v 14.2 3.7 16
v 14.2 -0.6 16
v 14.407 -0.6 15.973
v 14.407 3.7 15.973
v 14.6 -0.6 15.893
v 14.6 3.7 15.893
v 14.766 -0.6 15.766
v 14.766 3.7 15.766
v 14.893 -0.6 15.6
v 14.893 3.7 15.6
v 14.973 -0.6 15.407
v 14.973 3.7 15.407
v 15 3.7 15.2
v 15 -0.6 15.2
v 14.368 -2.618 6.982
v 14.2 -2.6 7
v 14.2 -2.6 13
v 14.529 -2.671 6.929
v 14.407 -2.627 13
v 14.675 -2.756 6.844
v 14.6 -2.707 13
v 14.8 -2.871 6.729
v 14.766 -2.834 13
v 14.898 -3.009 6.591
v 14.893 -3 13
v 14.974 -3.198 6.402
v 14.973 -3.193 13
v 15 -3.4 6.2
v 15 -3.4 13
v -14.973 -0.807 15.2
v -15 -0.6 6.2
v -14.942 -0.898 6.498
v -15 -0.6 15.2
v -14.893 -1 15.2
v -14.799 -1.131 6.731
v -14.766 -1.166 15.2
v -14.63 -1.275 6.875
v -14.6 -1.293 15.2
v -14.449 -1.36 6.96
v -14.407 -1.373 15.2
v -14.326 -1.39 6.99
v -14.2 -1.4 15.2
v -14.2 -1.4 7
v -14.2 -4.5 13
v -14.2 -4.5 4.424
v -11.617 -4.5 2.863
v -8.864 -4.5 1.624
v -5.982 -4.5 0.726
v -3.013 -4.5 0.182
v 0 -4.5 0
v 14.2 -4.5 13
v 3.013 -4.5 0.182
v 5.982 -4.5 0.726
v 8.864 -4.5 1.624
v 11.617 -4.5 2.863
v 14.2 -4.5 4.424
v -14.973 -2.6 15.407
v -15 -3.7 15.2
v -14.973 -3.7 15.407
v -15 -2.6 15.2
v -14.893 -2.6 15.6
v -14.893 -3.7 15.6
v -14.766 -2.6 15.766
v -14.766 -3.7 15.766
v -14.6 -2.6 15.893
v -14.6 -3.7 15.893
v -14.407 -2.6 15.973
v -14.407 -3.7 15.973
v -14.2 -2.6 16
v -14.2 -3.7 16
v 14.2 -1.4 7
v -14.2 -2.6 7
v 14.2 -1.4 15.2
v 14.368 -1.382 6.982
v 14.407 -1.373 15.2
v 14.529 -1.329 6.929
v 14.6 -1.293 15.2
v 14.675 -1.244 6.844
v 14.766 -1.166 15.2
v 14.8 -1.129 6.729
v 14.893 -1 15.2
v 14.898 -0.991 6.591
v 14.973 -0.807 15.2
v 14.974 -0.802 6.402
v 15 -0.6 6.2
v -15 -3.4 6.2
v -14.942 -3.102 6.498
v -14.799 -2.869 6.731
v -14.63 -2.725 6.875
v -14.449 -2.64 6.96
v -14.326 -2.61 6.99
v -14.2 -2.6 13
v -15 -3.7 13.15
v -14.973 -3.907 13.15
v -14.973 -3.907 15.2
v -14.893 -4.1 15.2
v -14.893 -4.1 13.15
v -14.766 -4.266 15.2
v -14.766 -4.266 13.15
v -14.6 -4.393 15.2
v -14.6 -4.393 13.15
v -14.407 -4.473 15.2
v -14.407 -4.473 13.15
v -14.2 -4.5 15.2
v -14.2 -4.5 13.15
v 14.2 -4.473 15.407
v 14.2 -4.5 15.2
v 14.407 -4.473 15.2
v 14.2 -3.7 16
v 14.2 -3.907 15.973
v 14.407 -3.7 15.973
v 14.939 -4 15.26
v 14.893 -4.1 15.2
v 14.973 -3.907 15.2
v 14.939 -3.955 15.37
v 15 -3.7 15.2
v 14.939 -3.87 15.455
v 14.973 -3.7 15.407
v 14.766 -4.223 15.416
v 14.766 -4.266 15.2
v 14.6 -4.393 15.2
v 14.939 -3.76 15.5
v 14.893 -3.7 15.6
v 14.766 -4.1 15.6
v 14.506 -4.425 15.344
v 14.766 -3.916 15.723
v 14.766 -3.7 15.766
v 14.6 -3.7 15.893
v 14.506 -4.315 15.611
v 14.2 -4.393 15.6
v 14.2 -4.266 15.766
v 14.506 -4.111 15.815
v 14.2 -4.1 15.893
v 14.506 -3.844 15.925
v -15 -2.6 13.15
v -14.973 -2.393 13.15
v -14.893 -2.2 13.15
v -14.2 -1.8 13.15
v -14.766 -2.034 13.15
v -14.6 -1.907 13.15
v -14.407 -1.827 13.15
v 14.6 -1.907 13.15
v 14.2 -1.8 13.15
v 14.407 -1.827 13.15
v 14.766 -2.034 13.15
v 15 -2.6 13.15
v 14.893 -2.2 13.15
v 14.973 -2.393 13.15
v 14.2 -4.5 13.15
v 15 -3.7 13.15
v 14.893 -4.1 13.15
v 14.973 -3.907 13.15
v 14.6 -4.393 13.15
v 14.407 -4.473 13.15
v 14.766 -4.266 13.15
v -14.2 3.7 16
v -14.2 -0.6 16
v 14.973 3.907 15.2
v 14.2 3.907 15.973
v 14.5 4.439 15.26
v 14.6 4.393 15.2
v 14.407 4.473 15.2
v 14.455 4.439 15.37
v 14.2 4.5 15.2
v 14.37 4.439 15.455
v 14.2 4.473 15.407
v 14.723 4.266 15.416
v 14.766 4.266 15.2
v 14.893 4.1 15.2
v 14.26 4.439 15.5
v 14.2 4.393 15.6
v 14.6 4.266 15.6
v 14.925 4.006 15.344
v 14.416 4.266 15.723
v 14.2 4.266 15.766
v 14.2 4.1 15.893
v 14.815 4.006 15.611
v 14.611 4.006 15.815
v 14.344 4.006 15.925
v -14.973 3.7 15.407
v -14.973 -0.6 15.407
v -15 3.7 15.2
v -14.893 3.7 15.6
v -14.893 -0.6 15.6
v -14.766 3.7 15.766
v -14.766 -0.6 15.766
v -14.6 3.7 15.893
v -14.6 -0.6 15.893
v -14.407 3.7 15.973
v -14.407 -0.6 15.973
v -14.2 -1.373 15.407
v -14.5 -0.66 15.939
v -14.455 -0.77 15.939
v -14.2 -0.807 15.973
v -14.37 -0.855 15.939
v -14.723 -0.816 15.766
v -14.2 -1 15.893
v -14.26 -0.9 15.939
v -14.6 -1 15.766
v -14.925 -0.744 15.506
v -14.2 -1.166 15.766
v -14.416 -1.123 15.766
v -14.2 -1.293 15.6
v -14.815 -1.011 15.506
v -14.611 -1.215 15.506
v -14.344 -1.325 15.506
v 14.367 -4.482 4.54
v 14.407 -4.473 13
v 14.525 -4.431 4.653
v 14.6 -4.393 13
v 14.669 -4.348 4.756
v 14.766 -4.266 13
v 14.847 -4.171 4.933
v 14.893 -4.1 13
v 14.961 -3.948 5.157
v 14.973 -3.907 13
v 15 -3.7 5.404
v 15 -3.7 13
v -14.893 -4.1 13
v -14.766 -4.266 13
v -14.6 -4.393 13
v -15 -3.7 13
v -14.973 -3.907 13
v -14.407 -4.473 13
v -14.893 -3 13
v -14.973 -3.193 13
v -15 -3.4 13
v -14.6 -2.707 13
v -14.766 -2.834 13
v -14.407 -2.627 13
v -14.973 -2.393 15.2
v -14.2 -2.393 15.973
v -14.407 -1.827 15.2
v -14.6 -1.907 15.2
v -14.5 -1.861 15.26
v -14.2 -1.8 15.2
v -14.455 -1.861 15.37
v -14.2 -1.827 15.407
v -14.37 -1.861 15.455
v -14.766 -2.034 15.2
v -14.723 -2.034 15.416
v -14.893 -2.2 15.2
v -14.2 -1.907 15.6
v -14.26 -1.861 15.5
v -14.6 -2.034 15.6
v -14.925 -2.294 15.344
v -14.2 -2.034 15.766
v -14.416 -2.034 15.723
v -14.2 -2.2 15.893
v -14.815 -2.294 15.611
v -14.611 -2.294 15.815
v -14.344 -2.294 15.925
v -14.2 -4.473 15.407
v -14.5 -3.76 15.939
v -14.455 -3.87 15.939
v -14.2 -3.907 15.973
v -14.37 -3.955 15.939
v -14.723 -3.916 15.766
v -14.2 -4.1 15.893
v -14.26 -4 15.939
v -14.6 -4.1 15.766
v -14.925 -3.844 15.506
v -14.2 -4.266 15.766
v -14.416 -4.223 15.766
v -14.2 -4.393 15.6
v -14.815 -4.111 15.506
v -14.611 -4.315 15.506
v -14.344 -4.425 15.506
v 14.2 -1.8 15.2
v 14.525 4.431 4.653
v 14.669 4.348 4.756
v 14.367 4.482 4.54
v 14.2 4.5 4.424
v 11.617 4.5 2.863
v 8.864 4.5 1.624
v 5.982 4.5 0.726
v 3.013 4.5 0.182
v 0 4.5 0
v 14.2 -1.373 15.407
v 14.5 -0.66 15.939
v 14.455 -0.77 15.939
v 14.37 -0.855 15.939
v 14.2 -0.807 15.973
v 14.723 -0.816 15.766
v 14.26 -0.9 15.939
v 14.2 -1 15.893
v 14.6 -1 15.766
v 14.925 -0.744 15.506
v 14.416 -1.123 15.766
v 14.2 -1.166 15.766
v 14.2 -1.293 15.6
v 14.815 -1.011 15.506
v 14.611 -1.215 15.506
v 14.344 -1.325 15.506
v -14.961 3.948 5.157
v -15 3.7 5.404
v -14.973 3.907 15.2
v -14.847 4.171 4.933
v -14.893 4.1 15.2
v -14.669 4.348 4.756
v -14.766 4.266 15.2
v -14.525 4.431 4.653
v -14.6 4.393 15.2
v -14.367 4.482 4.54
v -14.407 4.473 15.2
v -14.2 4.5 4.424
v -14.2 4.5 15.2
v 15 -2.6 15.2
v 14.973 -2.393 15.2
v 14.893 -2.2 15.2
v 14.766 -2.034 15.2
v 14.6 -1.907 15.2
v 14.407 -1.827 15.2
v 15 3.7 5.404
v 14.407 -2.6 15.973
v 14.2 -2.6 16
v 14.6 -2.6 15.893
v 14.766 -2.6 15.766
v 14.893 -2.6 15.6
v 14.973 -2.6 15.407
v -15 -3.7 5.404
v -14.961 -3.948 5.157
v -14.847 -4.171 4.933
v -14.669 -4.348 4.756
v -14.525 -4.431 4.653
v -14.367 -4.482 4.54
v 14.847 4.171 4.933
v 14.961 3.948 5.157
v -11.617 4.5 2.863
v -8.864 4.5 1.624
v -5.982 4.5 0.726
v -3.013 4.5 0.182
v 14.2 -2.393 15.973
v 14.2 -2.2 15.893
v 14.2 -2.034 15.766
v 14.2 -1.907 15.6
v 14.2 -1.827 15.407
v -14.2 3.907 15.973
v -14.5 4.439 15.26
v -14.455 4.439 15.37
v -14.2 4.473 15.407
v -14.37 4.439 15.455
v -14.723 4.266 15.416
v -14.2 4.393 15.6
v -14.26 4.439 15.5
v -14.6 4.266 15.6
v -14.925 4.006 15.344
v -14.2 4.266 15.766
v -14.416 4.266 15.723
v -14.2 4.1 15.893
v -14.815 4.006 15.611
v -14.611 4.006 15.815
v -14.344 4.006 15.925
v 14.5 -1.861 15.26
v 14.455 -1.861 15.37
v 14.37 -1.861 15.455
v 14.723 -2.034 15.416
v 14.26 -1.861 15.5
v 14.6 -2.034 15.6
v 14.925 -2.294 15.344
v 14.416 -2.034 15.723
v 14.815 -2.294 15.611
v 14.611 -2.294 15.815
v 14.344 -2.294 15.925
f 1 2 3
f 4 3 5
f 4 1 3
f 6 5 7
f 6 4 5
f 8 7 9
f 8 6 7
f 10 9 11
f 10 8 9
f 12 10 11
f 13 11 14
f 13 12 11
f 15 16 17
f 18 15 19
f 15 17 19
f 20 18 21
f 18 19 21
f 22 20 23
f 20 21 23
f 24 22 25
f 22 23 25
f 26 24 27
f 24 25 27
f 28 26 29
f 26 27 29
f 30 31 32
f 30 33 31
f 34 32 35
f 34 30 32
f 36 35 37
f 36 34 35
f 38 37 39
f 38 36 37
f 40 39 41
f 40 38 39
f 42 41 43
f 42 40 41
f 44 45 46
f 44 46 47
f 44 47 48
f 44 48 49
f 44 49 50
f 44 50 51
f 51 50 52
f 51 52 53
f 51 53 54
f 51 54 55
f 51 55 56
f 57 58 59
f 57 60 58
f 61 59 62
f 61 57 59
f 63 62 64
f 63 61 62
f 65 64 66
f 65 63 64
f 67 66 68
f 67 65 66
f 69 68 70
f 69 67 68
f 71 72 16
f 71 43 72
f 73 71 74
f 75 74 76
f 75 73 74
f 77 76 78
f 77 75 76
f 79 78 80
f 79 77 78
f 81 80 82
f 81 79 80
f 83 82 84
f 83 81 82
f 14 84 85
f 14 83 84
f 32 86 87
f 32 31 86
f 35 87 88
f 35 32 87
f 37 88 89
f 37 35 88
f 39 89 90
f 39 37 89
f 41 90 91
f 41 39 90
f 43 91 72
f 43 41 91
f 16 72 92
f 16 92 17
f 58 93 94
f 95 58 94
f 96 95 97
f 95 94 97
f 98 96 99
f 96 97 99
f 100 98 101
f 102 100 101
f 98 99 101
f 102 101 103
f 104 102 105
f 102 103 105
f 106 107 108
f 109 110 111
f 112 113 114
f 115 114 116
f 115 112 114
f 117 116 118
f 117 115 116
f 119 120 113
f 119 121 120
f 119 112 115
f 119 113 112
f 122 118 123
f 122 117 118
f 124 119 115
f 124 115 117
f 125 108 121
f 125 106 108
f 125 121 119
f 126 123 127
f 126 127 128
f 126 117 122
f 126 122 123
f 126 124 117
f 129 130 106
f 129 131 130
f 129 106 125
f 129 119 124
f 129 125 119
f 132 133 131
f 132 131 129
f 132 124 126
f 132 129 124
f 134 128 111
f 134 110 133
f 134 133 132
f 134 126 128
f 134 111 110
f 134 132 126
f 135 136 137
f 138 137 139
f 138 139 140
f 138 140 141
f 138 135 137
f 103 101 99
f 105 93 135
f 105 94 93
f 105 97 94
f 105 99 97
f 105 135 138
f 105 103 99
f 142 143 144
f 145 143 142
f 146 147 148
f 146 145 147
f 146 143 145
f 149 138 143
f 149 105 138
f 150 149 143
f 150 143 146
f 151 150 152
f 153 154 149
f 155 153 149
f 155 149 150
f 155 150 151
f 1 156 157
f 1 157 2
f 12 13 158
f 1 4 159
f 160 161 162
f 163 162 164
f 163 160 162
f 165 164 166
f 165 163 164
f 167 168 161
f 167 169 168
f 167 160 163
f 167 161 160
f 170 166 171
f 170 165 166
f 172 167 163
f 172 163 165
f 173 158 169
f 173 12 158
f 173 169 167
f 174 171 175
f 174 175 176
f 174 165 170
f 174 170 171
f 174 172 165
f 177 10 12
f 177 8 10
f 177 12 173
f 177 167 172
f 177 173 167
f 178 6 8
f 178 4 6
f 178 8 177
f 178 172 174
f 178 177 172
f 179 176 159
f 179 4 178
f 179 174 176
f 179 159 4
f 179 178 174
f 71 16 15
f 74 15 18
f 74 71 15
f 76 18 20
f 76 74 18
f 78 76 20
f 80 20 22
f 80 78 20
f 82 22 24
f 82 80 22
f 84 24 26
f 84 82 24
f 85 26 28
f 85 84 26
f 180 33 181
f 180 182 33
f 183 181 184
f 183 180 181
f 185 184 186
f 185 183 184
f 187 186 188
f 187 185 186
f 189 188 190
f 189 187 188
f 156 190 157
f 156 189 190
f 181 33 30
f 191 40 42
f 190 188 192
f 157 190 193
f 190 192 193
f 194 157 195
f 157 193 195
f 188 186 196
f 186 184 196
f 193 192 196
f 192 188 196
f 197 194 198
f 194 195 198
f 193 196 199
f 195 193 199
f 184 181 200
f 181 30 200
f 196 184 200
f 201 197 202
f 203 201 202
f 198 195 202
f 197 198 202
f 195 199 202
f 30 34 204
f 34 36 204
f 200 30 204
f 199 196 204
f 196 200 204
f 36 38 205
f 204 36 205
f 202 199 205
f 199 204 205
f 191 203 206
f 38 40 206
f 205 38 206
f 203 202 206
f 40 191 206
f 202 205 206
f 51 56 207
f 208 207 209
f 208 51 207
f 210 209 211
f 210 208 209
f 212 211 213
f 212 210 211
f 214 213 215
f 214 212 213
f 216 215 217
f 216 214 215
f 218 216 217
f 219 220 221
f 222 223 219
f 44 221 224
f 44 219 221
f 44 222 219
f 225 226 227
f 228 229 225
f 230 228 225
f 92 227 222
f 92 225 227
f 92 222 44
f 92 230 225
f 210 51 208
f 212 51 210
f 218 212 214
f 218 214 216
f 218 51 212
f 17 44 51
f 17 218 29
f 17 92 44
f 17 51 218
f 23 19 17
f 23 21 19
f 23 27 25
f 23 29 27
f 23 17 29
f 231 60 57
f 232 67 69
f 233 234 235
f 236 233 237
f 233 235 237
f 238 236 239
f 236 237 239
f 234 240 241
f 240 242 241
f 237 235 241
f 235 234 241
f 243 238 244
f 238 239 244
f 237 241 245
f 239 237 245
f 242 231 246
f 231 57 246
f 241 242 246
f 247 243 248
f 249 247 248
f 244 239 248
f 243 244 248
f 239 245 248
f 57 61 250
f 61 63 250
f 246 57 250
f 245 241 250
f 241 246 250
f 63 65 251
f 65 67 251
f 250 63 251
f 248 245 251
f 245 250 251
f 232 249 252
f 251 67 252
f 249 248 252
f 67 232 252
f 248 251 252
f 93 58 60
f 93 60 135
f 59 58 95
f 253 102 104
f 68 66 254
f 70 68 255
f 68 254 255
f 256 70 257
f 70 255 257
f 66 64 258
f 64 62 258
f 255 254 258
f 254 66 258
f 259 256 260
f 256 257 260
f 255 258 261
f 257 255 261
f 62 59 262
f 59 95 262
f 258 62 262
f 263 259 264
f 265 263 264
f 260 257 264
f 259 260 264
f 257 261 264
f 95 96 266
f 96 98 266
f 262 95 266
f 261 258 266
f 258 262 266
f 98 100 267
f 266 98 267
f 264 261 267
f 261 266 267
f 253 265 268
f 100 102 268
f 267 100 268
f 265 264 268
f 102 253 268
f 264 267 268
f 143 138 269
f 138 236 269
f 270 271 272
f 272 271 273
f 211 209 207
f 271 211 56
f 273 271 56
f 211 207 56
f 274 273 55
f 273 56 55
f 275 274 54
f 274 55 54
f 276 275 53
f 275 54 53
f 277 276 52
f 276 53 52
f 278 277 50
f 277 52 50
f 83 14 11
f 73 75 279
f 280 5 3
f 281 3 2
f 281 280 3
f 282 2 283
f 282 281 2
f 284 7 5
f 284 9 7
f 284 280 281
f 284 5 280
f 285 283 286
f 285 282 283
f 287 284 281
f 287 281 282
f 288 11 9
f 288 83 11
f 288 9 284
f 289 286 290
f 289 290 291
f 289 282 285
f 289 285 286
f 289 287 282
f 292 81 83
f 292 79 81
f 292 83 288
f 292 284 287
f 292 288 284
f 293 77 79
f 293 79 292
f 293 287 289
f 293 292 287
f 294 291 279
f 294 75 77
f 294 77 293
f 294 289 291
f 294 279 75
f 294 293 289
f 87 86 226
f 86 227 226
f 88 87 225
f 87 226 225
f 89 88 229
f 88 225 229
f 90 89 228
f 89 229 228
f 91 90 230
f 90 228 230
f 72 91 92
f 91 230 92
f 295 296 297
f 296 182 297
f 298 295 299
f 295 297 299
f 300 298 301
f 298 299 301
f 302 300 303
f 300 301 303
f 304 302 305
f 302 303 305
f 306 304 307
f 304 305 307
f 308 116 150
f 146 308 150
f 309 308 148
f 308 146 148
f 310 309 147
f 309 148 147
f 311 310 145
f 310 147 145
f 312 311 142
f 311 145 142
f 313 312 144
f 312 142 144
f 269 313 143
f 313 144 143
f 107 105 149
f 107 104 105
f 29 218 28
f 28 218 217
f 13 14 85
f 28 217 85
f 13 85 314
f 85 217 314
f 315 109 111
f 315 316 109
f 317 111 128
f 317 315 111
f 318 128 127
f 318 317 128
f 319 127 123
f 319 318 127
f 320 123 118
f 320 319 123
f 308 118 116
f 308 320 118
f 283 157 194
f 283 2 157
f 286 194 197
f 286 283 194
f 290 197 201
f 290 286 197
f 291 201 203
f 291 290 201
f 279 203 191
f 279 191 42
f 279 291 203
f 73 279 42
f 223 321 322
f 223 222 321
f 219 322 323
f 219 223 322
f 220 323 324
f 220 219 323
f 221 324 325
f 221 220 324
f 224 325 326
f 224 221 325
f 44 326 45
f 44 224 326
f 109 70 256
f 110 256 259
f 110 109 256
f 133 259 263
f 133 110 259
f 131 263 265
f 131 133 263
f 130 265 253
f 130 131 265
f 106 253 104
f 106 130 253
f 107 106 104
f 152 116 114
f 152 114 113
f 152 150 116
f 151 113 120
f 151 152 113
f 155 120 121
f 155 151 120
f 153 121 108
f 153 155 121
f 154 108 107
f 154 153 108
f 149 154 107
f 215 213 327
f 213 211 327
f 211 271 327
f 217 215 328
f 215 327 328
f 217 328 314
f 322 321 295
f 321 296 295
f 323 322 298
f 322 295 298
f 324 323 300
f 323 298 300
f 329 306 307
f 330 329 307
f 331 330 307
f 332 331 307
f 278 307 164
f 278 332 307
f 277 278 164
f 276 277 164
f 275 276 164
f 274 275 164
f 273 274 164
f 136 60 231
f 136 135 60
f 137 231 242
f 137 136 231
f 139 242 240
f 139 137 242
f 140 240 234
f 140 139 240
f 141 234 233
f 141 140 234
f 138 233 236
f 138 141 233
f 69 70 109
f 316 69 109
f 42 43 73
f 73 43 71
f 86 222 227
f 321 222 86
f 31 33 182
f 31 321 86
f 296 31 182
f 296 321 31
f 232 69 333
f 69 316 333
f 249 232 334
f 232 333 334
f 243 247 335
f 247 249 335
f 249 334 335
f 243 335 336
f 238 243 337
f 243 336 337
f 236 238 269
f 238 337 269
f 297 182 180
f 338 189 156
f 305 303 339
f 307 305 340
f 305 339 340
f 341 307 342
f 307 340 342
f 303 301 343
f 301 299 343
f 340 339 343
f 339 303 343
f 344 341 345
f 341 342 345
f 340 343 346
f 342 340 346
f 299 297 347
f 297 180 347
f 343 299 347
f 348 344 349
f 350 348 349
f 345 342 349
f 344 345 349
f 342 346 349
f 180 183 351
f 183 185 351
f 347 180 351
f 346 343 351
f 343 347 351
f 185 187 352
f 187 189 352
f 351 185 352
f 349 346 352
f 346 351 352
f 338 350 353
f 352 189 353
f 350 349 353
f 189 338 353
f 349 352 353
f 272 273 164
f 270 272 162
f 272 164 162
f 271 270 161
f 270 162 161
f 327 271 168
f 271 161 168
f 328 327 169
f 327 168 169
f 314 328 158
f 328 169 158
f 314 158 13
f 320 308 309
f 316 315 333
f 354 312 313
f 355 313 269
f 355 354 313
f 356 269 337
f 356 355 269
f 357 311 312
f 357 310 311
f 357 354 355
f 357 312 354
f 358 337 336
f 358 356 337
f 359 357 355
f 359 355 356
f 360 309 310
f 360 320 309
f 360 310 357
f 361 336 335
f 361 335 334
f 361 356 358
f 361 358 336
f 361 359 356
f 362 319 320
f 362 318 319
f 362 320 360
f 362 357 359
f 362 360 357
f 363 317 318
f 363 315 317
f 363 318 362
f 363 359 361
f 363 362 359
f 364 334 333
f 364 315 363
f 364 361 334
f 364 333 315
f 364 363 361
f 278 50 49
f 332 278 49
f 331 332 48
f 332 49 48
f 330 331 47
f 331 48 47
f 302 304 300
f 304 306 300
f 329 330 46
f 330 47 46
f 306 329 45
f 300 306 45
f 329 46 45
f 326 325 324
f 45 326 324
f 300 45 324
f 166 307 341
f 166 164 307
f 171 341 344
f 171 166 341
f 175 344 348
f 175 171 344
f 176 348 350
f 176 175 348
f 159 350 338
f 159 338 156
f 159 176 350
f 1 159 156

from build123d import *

# Parameters (mm, degrees)
F0_W     = 30
F0_H     = 5.9
F1_DEPTH = 16
F0_H_2   = 1.9
F2_DEPTH = 13
F0_H_3   = 1.2
F3_DEPTH = 7
F5_DEPTH = 9.001
F6_W     = 30
F6_H     = 1.9
F7_DEPTH = 2.85
F8_DEPTH = 0.8
F9_R     = 0.8
F9_2_R   = 0.8


with BuildPart() as f1:
    # F0 (on Top) → F1 (new body)
    with BuildSketch(Plane.XY):
        with Locations((0, 1.55)):
            Rectangle(F0_W, F0_H)
    extrude(amount=F1_DEPTH)



with BuildPart() as f2:
    # F0 (on Top) → F2 (new body)
    with BuildSketch(Plane.XY):
        with Locations((0, -3.55)):
            Rectangle(F0_W, F0_H_2)
    extrude(amount=F2_DEPTH)


with BuildPart() as f1_1:
    add(f1.part)

    add(f2.part)  # F3 merges F2
    # F0 (on Top) → F3 (join)
    with BuildSketch(Plane.XY):
        with Locations((0, -2)):
            Rectangle(F0_W, F0_H_3)
    extrude(amount=F3_DEPTH)

    # F4 (on face) → F5 (cut, through all)
    with BuildSketch(Plane.XZ.offset(4.5)):
        with BuildLine():
            ThreePointArc((0, 0), (-7.9056941504, 1.2829175487), (-15, 5))
            Line((-15, 5), (-15, 0))
            Line((-15, 0), (0, 0))
        make_face()
        with BuildLine():
            ThreePointArc((15, 5), (7.9056941504, 1.2829175487), (0, 0))
            Line((0, 0), (15, 0))
            Line((15, 0), (15, 5))
        make_face()
    extrude(amount=-F5_DEPTH, mode=Mode.SUBTRACT)

    # F9
    f9_edges = [f1_1.edges().sort_by_distance(p)[0] for p in [
        (-15, 0, 5),
        (15, 0, 5),
        (-15, -4.5, 9),
        (-15, -2.6, 10),
        (-15, -1.4, 11.5),
        (-15, -2, 7),
        (-15, 1.55, 16),
        (15, -1.4, 11.5),
        (15, -2.6, 10),
        (15, -4.5, 9),
        (15, -2, 7),
        (15, 1.55, 16),
        (0, -1.4, 16),
        (-15, 4.5, 10.5),
        (15, 4.5, 10.5),
        (0, 4.5, 16),
    ]]
    fillet(f9_edges, radius=F9_R)


with BuildPart() as f7:
    # F6 (on face) → F7 (new body, through all)
    with BuildSketch(Plane.XY.offset(16)):
        with Locations((0, -3.55)):
            Rectangle(F6_W, F6_H)
    extrude(amount=-F7_DEPTH)

    # F8 (add, through all): a face of the model
    f8_faces = [f7.faces().sort_by_distance(p)[0] for p in [
        (0, -2.6, 14.575),
    ]]
    extrude(f8_faces, amount=F8_DEPTH)

    # F9#2
    f9_2_edges = [f7.edges().sort_by_distance(p)[0] for p in [
        (-15, -4.5, 14.575),
        (-15, -3.15, 16),
        (0, -4.5, 16),
        (15, -4.5, 14.575),
        (15, -3.15, 16),
        (-15, -1.8, 14.575),
        (15, -1.8, 14.575),
        (0, -1.8, 16),
    ]]
    fillet(f9_2_edges, radius=F9_2_R)


solid = Compound([f1_1.part, f7.part])
